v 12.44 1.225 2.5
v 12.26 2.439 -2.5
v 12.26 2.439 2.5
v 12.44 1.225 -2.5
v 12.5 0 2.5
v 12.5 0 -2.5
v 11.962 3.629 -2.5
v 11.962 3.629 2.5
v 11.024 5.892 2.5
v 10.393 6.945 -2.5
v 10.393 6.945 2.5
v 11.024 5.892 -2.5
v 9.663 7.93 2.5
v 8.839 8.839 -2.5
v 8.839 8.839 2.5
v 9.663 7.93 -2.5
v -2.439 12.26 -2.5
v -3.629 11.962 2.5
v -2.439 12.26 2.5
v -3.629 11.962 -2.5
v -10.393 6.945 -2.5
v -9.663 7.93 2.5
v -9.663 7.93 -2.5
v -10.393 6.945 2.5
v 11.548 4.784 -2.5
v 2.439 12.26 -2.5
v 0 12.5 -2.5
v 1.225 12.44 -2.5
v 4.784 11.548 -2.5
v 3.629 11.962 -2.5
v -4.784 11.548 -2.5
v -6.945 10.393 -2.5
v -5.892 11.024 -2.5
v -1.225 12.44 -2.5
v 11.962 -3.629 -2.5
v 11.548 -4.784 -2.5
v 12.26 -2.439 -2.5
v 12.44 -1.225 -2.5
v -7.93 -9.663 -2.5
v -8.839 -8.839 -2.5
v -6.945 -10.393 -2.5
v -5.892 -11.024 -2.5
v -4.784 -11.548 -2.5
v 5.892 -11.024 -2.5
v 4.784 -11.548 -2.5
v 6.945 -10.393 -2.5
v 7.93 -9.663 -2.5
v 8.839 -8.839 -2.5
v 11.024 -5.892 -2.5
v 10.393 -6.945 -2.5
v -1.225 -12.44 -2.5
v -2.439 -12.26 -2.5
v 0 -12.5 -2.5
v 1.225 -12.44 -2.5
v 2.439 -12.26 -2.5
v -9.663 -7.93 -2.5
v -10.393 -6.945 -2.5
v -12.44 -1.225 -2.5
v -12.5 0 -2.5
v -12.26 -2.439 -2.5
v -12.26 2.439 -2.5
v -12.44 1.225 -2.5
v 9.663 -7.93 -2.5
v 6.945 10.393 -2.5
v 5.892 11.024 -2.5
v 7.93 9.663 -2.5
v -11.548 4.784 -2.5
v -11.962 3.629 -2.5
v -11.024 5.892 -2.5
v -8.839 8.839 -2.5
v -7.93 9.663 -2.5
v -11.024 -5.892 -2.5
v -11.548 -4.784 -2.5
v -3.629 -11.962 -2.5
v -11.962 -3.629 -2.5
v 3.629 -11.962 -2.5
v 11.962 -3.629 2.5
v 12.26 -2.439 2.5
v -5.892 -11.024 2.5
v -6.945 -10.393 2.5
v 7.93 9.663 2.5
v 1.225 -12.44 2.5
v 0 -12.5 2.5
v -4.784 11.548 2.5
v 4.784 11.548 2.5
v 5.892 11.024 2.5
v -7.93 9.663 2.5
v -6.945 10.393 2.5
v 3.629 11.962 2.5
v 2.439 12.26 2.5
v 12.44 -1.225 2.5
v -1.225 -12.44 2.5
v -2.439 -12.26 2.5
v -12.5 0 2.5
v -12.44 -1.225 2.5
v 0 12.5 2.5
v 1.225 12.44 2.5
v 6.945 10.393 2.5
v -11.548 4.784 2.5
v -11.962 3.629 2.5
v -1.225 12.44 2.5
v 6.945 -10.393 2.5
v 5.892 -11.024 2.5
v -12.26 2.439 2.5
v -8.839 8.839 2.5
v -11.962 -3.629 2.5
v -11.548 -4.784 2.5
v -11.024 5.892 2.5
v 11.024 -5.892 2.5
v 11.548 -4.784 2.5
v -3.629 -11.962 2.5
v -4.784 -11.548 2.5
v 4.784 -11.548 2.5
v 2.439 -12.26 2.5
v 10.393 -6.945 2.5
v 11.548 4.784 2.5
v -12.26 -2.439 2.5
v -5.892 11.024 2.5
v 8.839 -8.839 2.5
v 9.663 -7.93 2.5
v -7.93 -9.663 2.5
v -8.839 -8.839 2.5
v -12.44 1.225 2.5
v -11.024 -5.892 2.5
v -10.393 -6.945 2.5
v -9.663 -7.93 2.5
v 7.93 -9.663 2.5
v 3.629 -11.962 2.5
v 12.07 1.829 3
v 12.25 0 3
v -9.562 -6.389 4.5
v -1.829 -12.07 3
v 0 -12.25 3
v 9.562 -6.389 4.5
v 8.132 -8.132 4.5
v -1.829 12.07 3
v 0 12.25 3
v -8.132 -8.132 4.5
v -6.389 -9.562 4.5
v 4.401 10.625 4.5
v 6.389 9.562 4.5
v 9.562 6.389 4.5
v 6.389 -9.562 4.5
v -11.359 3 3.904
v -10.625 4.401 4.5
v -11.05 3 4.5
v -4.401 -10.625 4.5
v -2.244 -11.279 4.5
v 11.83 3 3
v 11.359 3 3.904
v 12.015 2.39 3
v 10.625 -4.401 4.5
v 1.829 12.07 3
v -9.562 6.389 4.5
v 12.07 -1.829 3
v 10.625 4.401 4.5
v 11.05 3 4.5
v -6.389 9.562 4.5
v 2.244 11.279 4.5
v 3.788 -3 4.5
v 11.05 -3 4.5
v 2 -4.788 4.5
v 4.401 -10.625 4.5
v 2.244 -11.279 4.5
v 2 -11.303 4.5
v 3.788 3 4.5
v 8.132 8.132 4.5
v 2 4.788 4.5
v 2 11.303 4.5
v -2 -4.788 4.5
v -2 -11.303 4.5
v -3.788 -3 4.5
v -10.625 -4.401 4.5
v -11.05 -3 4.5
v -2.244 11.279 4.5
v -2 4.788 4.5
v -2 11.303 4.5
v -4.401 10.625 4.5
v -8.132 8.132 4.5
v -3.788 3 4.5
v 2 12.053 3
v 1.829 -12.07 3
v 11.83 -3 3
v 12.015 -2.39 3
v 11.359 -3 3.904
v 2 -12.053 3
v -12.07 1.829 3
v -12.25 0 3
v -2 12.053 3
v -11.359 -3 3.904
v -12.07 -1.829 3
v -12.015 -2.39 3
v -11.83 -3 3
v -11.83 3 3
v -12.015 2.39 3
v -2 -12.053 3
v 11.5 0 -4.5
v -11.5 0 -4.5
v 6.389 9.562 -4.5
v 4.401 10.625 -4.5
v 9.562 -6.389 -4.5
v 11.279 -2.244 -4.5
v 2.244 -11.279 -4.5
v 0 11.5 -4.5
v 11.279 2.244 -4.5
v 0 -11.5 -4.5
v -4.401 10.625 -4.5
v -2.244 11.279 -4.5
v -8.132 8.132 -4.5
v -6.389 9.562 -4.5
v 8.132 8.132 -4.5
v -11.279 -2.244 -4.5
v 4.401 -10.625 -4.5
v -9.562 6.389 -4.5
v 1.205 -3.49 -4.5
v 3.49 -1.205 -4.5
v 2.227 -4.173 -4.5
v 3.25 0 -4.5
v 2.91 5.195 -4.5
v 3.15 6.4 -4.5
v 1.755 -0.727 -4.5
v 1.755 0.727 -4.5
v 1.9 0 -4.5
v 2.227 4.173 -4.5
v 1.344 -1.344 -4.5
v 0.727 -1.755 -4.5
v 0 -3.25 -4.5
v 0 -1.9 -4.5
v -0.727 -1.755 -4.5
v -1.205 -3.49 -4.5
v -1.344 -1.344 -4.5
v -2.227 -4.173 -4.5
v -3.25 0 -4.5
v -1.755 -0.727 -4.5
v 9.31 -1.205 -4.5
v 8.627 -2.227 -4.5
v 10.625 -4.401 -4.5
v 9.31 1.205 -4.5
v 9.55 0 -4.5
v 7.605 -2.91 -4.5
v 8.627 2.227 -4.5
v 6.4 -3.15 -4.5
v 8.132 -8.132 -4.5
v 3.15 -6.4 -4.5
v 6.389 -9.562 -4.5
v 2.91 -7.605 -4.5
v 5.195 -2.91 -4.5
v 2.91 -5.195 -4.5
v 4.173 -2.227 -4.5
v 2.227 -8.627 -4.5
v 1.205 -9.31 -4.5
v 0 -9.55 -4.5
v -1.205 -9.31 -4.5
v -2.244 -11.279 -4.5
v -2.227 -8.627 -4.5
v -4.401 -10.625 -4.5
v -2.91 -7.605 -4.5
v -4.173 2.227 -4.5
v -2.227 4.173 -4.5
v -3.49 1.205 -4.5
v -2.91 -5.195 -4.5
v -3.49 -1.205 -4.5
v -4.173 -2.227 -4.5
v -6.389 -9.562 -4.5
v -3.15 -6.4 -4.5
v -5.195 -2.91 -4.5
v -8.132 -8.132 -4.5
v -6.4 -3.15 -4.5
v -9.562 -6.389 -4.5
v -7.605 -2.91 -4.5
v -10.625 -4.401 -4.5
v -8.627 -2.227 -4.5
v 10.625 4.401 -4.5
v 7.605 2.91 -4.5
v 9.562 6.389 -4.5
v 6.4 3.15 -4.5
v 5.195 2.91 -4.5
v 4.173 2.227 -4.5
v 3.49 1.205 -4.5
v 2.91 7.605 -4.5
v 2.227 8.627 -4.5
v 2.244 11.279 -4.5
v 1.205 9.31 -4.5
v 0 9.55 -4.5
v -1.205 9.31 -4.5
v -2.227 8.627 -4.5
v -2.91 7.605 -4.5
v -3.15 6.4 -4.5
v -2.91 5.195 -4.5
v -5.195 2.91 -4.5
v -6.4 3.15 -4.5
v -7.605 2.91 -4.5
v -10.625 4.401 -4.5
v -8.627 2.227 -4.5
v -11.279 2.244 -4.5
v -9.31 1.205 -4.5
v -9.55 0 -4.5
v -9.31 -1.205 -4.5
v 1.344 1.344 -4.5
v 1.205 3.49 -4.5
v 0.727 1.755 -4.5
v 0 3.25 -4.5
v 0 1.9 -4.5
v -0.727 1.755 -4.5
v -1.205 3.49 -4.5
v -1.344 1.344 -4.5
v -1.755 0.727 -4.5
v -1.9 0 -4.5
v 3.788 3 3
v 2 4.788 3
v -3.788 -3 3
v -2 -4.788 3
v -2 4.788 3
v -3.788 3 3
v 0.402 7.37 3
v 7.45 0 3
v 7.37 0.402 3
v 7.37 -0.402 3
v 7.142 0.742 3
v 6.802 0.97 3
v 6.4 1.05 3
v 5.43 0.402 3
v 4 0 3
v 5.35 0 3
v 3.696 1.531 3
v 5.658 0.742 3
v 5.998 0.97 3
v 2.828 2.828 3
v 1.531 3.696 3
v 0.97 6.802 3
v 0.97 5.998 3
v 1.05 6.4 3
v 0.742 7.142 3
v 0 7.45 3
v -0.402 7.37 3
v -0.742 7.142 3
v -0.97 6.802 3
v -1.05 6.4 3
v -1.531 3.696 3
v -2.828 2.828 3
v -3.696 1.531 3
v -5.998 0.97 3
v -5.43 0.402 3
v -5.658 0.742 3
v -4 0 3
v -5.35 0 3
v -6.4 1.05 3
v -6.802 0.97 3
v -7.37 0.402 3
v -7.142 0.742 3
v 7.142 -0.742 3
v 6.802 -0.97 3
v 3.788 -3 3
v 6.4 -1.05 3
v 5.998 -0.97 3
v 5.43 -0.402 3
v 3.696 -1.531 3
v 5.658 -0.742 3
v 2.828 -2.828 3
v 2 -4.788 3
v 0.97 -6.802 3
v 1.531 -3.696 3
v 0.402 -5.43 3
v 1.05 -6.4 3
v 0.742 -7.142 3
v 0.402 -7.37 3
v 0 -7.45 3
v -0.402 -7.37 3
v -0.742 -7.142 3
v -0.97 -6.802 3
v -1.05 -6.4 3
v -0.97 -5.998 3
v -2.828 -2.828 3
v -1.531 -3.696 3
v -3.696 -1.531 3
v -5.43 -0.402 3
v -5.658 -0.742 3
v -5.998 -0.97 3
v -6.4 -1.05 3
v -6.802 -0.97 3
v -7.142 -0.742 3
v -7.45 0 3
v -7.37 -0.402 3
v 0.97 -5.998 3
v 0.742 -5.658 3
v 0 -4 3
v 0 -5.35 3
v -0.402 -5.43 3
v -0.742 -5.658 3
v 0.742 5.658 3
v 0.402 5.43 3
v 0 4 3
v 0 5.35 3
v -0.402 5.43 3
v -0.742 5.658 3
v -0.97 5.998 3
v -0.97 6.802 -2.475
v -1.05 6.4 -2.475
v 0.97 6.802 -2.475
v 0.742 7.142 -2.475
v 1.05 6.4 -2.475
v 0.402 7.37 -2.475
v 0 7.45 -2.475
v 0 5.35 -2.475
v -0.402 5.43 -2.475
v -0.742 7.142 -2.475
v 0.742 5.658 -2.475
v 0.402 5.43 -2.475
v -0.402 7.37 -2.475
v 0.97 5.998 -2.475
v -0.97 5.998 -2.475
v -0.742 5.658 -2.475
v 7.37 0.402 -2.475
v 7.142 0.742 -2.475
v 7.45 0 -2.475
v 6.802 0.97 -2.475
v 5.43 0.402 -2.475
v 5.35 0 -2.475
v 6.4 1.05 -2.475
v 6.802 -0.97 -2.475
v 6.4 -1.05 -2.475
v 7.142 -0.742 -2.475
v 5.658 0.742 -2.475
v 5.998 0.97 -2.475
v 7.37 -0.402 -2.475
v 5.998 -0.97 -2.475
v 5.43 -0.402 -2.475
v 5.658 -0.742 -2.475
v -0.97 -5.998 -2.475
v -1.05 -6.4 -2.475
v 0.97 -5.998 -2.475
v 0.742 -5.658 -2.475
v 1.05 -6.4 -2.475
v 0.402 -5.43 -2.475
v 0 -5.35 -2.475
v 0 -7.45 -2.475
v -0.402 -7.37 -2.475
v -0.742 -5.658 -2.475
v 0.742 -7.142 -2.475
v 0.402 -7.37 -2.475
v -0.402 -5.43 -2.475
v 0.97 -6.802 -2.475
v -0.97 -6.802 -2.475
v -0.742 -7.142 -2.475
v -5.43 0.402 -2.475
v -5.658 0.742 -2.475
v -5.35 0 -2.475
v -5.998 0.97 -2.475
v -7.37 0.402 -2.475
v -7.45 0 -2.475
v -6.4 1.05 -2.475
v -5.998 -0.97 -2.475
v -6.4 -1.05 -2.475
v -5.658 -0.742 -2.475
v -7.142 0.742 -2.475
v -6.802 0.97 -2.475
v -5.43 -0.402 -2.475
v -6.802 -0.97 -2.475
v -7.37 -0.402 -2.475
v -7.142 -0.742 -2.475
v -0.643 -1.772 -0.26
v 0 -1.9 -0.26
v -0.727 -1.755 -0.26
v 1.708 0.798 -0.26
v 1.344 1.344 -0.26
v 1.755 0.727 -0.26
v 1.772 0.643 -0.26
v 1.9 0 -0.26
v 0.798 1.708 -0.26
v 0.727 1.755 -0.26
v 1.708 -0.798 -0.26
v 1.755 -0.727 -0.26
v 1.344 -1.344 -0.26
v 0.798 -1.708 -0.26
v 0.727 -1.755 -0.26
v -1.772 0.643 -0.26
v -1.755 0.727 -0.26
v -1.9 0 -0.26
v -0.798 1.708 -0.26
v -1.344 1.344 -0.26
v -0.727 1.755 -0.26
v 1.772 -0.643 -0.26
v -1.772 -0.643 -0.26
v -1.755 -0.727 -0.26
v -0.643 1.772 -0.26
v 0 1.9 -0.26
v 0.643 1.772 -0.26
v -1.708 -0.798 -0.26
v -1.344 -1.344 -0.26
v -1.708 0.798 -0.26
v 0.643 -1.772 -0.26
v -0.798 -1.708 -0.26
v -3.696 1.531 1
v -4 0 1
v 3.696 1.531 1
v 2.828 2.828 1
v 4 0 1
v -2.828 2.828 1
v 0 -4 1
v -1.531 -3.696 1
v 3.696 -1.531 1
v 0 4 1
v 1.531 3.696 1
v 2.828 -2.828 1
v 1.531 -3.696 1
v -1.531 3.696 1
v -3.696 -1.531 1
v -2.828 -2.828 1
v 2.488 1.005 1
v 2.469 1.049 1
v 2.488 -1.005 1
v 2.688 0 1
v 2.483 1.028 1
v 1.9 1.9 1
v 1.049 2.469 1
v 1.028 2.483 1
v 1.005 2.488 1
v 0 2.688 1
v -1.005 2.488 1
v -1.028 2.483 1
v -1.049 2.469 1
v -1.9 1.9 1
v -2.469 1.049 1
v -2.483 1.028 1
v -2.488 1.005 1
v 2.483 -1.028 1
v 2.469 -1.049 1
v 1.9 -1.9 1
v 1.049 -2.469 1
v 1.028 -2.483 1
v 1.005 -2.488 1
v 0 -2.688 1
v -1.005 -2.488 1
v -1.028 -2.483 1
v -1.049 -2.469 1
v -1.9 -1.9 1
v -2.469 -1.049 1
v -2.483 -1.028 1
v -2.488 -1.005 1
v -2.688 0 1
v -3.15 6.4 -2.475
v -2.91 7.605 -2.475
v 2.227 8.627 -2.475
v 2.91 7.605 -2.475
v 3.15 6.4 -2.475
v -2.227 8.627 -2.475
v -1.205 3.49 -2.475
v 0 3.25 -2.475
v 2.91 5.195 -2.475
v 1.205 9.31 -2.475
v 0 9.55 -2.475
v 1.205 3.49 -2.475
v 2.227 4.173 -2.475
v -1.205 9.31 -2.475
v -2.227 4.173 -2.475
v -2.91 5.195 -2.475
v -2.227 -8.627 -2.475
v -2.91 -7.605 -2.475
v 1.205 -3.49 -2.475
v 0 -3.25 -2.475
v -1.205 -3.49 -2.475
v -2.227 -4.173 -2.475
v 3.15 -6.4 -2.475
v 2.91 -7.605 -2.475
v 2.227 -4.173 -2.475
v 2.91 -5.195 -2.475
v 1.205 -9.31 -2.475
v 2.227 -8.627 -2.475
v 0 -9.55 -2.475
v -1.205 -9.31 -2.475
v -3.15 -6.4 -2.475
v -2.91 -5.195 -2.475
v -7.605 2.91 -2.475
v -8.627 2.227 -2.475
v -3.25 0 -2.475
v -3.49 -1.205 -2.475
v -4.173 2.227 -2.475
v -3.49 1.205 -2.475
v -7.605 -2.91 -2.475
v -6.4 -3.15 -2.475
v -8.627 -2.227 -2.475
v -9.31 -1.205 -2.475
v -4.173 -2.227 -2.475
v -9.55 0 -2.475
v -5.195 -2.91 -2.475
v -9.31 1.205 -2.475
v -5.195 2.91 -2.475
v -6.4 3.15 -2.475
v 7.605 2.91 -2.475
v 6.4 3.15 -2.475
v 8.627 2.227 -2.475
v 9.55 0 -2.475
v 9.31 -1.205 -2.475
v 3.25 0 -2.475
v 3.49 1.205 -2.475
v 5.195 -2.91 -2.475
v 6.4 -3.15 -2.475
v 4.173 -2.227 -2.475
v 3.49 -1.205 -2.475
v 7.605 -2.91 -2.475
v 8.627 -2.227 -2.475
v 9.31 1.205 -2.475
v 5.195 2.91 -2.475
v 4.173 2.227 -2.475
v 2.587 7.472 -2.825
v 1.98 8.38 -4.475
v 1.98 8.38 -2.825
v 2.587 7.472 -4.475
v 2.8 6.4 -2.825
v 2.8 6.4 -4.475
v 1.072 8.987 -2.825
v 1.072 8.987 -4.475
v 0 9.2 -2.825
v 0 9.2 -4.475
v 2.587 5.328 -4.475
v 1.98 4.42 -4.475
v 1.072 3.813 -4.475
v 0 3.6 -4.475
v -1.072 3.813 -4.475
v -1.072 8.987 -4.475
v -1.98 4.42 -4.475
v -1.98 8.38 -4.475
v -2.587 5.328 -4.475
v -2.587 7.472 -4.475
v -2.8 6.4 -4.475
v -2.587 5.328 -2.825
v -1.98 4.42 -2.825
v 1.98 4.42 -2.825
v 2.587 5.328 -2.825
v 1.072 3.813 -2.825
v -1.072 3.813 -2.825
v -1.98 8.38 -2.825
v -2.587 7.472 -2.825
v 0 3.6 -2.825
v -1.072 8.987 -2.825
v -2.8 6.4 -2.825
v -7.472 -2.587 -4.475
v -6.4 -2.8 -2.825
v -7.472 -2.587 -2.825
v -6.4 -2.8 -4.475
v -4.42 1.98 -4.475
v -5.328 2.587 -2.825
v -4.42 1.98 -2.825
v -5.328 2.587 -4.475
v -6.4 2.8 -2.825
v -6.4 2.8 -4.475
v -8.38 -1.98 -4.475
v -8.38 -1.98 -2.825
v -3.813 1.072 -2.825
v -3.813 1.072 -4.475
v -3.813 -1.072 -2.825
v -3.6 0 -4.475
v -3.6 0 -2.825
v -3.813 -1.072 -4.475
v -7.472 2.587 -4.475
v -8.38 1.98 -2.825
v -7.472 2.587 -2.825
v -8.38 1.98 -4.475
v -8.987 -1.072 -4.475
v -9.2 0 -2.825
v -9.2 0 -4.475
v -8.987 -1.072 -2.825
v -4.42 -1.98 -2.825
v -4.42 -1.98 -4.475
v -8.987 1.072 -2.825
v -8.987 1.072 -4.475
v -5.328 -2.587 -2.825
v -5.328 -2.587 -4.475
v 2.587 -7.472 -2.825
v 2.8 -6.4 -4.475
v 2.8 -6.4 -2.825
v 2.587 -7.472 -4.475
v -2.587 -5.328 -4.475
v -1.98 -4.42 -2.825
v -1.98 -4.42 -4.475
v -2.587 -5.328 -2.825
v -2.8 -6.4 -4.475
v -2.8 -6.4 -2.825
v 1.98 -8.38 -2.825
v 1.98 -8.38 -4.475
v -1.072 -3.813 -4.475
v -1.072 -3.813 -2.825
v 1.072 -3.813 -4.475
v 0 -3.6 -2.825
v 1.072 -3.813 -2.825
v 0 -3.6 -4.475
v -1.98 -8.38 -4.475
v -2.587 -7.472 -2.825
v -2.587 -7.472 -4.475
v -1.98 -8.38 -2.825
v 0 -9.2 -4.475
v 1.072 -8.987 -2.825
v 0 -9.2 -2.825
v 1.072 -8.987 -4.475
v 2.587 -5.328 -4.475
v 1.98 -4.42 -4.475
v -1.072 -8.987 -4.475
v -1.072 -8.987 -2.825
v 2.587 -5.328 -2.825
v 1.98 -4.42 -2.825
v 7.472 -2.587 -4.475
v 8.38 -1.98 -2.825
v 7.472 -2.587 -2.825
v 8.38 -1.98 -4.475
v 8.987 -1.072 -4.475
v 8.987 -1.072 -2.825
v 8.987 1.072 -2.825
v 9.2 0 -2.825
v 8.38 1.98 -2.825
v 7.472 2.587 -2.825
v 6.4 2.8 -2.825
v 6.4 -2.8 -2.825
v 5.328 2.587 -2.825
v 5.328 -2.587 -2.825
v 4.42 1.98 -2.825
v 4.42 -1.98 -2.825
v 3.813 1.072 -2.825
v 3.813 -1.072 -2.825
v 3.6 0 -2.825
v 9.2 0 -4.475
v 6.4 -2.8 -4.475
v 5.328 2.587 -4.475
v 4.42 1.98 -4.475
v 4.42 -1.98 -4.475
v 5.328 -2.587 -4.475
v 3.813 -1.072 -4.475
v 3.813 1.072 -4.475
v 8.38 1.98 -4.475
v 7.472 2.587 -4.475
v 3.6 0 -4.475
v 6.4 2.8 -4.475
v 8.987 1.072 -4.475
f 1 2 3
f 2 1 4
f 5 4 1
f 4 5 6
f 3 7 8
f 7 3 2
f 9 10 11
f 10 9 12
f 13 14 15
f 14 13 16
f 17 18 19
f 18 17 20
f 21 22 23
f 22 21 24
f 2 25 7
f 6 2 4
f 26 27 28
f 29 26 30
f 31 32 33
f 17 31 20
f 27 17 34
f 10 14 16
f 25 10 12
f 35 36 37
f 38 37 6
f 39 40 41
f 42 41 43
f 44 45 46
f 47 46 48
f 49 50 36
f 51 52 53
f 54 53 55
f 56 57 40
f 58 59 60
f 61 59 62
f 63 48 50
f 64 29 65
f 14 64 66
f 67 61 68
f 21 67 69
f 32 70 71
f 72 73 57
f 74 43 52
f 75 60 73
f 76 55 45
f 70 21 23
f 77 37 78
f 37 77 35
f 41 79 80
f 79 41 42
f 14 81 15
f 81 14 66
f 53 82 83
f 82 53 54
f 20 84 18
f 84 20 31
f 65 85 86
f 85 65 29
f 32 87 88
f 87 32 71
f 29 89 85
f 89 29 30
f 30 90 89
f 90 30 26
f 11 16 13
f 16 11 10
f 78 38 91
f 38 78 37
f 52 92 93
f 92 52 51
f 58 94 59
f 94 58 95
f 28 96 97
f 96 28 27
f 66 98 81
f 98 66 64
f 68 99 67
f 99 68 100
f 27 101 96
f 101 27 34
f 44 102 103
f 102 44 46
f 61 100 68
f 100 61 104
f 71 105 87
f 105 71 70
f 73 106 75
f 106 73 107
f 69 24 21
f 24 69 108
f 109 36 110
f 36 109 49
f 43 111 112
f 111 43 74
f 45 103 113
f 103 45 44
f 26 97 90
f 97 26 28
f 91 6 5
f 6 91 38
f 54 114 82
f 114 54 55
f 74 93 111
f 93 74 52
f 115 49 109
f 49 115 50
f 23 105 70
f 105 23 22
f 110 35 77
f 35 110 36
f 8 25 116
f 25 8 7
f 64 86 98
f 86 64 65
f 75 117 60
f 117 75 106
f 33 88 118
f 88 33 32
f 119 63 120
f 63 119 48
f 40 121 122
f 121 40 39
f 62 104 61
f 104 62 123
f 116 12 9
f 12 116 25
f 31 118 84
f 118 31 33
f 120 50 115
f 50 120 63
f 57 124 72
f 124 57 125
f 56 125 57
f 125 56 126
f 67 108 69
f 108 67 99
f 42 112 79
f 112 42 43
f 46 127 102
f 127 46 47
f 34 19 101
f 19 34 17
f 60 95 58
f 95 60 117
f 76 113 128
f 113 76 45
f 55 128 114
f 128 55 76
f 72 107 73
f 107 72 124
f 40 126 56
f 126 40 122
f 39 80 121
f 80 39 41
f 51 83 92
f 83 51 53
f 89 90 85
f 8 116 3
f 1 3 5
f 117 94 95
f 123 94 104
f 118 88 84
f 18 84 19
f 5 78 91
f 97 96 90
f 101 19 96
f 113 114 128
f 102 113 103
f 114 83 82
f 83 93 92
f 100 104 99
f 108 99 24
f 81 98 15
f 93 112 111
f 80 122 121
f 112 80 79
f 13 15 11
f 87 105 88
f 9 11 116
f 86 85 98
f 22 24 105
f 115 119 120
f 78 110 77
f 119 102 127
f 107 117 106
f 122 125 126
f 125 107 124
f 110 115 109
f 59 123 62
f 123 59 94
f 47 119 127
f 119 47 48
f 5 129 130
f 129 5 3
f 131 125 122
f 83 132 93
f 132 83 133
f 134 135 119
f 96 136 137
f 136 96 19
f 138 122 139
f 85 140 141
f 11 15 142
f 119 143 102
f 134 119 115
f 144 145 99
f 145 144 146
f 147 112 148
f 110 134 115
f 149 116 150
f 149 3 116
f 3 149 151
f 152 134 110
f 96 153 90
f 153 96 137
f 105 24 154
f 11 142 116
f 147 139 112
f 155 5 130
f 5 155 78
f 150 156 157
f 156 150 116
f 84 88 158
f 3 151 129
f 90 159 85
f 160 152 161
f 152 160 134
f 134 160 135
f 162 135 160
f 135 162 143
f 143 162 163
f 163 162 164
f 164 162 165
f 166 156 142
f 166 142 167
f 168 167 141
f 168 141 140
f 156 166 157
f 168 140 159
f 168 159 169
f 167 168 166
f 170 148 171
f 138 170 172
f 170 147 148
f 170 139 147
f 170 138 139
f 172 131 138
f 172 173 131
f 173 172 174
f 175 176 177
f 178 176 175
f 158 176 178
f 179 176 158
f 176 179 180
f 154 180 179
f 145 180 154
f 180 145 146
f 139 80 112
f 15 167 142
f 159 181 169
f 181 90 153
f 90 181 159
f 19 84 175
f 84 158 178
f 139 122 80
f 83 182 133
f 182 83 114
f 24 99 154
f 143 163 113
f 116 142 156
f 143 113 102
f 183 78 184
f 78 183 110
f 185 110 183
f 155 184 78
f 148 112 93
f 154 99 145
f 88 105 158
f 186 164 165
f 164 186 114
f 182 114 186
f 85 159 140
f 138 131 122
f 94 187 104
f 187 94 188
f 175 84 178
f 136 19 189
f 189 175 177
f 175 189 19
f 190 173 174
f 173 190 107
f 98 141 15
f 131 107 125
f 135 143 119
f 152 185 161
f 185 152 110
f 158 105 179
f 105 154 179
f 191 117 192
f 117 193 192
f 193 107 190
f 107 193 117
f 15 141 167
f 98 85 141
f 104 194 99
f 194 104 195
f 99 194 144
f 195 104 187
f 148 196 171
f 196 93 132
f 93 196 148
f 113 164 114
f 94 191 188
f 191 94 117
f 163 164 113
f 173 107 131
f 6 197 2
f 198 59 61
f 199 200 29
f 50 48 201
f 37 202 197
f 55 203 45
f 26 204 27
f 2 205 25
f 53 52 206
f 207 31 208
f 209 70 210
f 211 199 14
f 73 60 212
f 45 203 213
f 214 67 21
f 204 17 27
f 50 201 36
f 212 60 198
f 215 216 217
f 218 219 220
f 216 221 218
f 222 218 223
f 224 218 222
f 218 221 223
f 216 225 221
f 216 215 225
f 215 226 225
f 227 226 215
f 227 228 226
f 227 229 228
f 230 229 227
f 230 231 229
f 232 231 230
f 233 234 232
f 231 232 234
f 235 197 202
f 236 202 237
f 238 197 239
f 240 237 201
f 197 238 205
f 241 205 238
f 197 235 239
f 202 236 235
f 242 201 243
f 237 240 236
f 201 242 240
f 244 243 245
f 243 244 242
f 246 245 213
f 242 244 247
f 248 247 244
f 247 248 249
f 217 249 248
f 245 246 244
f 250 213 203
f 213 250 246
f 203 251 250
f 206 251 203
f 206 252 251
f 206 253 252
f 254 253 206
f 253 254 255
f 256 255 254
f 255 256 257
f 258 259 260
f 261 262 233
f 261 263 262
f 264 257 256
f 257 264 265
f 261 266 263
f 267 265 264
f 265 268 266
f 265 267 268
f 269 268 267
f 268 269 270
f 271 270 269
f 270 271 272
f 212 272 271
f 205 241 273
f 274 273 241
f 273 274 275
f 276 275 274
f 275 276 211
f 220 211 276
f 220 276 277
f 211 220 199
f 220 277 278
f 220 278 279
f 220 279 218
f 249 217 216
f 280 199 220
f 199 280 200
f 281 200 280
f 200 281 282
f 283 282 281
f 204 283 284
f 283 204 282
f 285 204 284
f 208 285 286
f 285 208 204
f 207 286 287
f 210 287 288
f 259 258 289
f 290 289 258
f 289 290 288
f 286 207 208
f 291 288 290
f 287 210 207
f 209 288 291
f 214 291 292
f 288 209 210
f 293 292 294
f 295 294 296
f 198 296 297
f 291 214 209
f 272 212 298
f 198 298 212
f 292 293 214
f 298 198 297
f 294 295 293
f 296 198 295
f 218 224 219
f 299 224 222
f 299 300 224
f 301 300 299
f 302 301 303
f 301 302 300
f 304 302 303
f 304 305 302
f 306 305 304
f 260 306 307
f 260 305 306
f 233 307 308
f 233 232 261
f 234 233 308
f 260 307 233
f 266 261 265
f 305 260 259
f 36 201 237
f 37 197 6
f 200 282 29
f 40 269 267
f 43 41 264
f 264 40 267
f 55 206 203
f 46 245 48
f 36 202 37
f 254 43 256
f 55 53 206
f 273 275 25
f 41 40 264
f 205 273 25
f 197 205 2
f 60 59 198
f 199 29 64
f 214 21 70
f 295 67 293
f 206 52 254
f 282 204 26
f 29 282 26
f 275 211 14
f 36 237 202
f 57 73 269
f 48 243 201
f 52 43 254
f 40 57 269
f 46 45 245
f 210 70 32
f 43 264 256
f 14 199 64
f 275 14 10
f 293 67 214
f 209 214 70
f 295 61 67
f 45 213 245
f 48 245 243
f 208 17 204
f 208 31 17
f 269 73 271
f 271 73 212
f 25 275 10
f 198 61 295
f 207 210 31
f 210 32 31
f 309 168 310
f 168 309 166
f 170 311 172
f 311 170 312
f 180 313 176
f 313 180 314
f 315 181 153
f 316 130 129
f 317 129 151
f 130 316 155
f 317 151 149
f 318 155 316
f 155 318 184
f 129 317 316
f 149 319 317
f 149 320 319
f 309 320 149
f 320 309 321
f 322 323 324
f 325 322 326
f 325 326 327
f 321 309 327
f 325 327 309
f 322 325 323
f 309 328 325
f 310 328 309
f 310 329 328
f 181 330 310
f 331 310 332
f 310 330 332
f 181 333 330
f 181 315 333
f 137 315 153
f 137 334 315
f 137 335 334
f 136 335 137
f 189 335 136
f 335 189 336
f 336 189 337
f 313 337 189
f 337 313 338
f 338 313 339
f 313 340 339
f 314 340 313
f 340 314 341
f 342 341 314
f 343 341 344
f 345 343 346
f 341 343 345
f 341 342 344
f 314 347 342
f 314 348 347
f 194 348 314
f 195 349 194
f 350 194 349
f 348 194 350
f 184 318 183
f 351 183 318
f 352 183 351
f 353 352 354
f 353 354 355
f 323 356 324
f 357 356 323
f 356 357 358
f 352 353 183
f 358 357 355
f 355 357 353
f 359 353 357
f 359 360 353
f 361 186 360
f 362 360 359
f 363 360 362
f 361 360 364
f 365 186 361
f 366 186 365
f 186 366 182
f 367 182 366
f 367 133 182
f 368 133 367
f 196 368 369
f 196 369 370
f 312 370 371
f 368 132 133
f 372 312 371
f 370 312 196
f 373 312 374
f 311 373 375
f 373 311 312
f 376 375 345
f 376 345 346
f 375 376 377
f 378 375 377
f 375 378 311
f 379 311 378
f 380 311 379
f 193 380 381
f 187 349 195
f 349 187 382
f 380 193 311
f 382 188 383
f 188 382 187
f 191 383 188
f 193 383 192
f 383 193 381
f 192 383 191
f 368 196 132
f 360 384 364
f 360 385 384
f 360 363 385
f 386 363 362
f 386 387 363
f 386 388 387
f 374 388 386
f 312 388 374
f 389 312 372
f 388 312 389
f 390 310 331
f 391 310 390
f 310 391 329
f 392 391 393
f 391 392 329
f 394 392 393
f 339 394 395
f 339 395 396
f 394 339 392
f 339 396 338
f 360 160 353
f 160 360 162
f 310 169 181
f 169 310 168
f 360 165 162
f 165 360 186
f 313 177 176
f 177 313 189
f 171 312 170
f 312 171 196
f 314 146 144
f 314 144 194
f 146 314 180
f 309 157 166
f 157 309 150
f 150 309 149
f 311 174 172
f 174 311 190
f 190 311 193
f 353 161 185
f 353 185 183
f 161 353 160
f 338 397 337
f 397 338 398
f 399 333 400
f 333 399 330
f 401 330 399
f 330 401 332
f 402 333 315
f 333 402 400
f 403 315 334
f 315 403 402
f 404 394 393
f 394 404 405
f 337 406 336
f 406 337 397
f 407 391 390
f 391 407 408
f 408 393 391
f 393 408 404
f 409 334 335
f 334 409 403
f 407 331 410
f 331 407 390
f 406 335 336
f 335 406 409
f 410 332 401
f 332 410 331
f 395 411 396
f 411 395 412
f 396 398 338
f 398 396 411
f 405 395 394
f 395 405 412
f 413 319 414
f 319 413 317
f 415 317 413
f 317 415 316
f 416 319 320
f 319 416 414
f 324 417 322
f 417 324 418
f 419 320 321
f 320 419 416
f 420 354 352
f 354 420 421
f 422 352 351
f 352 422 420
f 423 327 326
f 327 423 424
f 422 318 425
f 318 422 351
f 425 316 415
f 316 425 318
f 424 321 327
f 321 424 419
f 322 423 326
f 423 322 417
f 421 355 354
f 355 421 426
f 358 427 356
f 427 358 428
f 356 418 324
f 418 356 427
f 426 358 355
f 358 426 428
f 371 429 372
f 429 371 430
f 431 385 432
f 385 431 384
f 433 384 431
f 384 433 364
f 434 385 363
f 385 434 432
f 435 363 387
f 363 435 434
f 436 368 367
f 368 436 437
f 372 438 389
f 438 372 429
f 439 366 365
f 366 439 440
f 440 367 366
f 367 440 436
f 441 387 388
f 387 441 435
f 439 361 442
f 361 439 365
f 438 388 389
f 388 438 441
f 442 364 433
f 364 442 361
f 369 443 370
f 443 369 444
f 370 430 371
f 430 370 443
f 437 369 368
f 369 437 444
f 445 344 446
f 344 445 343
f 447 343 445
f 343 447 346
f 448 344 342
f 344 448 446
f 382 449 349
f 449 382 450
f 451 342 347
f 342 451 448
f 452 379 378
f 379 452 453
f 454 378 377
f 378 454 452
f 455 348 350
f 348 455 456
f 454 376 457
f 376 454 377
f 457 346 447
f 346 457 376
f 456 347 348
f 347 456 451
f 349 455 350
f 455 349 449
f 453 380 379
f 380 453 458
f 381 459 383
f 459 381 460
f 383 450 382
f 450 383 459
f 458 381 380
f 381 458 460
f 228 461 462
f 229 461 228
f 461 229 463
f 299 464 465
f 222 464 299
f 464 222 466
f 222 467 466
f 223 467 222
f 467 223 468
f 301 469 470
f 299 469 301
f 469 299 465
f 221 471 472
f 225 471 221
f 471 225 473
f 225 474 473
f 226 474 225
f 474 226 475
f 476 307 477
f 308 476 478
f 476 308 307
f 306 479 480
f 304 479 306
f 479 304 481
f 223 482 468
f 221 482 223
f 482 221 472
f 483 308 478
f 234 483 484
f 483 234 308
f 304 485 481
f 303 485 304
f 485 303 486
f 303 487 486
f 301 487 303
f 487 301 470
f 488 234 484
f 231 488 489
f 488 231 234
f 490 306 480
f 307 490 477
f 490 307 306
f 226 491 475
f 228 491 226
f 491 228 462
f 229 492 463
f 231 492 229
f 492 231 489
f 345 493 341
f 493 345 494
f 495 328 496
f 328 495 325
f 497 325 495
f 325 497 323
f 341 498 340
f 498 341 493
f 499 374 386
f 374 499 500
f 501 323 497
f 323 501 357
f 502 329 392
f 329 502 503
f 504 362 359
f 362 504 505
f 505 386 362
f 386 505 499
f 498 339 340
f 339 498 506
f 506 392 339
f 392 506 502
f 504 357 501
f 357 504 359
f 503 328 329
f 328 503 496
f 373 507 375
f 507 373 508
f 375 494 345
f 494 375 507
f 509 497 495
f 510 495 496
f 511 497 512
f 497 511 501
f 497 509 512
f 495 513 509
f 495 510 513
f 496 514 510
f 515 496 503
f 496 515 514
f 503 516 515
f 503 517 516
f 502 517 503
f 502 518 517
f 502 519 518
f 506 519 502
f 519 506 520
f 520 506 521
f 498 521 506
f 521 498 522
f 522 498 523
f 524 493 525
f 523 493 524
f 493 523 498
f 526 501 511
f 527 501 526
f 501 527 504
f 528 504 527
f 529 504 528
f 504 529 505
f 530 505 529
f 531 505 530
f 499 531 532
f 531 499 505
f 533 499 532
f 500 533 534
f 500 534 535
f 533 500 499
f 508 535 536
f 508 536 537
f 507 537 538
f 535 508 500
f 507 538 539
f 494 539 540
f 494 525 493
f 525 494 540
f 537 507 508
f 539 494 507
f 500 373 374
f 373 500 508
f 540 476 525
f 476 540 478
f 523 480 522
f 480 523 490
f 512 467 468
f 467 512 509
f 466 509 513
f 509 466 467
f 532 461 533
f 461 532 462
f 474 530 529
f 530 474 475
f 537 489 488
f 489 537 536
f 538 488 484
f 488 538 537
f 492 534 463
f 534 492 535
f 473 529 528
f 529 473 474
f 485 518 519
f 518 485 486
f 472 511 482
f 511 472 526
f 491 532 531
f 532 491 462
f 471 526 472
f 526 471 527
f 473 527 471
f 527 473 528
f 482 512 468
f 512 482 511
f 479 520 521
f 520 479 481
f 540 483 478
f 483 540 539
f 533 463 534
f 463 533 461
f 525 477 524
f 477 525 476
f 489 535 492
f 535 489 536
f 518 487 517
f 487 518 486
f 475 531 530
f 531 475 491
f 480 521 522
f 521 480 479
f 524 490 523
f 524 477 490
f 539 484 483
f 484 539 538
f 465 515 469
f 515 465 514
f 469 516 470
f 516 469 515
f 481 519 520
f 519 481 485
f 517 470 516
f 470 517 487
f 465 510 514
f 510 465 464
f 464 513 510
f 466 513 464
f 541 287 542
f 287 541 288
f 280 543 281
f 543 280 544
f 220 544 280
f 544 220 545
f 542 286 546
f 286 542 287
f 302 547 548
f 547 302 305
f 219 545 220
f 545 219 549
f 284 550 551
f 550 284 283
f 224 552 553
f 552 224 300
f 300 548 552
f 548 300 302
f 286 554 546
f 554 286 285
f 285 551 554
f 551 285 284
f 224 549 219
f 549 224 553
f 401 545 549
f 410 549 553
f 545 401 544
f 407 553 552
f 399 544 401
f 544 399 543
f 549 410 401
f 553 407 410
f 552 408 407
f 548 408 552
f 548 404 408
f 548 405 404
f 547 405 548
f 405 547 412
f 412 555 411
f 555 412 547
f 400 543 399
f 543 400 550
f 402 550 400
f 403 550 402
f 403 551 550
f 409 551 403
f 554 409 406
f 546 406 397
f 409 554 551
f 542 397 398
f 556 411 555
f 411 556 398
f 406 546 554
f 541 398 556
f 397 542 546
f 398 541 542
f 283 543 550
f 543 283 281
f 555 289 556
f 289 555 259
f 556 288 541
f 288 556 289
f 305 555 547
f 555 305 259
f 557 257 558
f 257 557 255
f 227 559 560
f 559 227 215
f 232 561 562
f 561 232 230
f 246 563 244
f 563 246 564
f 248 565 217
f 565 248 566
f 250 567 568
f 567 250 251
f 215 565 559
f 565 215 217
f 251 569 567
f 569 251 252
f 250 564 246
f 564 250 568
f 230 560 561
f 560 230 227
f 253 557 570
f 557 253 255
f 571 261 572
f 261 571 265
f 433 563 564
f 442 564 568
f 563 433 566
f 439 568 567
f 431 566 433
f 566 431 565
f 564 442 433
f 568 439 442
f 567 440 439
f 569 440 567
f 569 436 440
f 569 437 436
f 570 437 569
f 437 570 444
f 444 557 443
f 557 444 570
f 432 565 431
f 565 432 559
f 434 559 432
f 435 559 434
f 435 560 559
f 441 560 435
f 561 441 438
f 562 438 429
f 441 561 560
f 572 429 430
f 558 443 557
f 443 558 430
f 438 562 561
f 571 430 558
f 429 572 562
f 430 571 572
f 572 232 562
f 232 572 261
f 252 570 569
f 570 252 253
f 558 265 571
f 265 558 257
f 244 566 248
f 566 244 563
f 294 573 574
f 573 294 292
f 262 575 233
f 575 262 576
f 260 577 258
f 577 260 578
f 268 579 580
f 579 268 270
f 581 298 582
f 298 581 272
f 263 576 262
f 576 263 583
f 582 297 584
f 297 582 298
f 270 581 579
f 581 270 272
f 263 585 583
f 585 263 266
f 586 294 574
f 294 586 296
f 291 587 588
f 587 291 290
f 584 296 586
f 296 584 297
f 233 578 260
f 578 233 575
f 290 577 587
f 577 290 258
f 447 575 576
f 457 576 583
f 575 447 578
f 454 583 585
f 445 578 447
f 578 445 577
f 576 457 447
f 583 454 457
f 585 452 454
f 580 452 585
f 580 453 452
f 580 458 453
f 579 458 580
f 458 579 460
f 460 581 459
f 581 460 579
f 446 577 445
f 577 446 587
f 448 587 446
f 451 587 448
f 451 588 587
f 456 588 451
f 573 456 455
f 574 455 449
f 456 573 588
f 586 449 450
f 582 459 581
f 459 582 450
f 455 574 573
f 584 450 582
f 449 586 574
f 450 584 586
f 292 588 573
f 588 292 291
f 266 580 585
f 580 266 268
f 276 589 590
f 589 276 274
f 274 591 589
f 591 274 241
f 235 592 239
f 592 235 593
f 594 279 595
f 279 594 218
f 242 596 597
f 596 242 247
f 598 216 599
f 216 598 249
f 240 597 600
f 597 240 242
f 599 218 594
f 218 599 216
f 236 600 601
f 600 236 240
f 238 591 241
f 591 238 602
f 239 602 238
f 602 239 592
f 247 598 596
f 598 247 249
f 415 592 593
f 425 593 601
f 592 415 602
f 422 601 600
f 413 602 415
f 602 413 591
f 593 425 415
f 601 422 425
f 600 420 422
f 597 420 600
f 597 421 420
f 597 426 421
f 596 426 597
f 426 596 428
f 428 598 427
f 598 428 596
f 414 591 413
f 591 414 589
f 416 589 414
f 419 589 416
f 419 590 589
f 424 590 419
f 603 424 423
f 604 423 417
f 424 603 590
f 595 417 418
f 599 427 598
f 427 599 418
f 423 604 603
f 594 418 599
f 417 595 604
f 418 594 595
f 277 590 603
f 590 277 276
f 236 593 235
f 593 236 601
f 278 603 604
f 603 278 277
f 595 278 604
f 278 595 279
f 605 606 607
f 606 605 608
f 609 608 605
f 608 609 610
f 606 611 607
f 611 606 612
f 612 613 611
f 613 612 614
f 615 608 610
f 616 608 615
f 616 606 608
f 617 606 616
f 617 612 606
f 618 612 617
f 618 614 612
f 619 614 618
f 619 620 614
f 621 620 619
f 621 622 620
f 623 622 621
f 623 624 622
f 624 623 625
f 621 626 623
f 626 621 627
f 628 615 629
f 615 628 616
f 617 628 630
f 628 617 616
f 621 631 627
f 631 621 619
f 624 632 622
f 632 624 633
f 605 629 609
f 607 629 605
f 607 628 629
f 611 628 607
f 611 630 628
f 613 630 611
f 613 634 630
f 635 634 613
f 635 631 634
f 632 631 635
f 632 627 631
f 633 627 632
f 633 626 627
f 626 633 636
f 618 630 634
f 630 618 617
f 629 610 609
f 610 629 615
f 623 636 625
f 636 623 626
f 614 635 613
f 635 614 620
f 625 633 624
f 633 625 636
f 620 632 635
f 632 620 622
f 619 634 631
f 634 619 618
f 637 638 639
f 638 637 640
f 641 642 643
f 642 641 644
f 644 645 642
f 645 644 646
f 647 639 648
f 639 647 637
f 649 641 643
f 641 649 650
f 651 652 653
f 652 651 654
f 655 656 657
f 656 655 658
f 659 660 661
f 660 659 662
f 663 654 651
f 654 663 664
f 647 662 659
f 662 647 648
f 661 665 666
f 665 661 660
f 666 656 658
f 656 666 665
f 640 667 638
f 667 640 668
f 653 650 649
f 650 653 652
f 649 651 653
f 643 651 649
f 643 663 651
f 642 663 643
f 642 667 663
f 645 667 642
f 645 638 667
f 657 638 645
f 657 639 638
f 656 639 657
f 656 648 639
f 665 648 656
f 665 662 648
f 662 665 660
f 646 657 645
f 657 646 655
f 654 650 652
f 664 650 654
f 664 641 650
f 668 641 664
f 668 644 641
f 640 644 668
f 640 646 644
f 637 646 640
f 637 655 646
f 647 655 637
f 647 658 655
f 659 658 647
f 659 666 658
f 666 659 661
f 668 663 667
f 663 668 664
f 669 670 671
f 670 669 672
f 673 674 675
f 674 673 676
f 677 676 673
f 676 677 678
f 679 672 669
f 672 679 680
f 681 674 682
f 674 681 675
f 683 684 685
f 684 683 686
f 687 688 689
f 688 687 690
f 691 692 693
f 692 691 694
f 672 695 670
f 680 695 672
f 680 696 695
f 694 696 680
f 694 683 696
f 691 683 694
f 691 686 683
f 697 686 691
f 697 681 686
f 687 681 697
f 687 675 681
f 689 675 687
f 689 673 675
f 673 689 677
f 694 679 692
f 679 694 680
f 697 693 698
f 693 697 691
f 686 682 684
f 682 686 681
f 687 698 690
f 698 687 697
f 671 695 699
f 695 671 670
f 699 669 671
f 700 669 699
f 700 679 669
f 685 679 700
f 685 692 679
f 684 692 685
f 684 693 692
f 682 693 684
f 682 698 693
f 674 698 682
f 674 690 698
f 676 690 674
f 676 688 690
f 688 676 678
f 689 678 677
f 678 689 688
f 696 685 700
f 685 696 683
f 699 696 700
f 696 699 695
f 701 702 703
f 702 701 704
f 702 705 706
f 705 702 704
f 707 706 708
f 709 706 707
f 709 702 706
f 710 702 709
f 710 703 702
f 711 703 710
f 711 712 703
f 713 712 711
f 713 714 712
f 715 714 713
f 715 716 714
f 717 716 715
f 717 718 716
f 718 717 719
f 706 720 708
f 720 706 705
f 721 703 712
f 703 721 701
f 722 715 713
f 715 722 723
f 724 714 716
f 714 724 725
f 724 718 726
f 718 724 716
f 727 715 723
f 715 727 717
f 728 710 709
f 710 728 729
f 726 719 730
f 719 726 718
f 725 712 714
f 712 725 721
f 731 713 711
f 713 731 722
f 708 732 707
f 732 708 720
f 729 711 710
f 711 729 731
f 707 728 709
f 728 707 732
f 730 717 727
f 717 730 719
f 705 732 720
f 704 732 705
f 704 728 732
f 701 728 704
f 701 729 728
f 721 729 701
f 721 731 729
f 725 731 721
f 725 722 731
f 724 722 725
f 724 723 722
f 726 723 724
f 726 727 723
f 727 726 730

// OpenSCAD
d_bearing  = 10+0.3;
d_cylinder = 15+10;
h_cylinder = 10-5;
h_bottom   = 3;
width_wall_x = 4;
width_wall_y = 6;
d_side_hole = 2.1;
d_central_hole = 7;
r_horn_x = 6.4;
r_horn_y = 6.4;
deep_hole_mask = 3;
d_screw_m3 = 3.8;

module hole_mask() {
translate([0, 0, deep_hole_mask]) rotate([0, 0, 45])
  cube([1.6*width_wall_y, 1.6*width_wall_y, h_cylinder+1], center = true);
translate([0, 0, deep_hole_mask]) rotate([0, 0, 0])
cube([width_wall_x, d_cylinder+5, h_cylinder+1], center = true);
translate([0, 0, deep_hole_mask]) rotate([0, 0, 0])
cube([d_cylinder+5, width_wall_y, h_cylinder+1], center = true);

translate([0, r_horn_y, 0])
  cylinder(d=d_side_hole, h=2*h_cylinder+6, center=true, $fn=16);
translate([r_horn_x,0, 0])
  cylinder(d=d_side_hole, h=2*h_cylinder+6, center=true, $fn=16);    
translate([0, -r_horn_y, 0])
  cylinder(d=d_side_hole, h=2*h_cylinder+6, center=true, $fn=16);    
translate([-r_horn_x, 0, 0])
  cylinder(d=d_side_hole, h=2*h_cylinder+6, center=true, $fn=16);    
translate([0, 0, 0])
  cylinder(d=d_screw_m3, h=2*h_cylinder+6, center=true, $fn=16);
//  cylinder(d=d_central_hole, h=2*h_cylinder+6, center=true, $fn=16);
//translate([0, 0, (h_cylinder+3-h_cylinder)])
//  #cylinder(d=d_bearing, h=2*h_cylinder+6, center=true, $fn=32);    

}

module hole_head_screw1(){
  cylinder(d = 8, h = 3 + 1, center=true, $fn=16);
  translate([0, 0, -(3 + 0.5)])
    cylinder(d1 = 1, d2 = 6, h = 3 + 1, center=true, $fn=16);  
}

module hole_head_screw1(){
  cylinder(d = 8, h = 3 + 1, center=true, $fn=16);
  translate([0, 0, -(3 + 0.5)])
    cylinder(d1 = 1, d2 = 6, h = 3 + 1, center=true, $fn=16);  
}

module hole_head_screw2(){
  translate([0, r_horn_y, -4 + 0.35])
   cylinder(d=3*d_side_hole, h = 2 + 0.35, center=true, $fn=16);
}

module hole_head_screw3(){
  hole_head_screw2();
  mirror([0, 1, 0])
    hole_head_screw2();
  mirror([1, 1, 0])
    hole_head_screw2();
  mirror([1, 0, 0])
    mirror([1, 1, 0])
      hole_head_screw2();
}

module support_hole_head_screw2(){
  translate([0, r_horn_y, -4 + 0.35 + -0])
    cylinder(d=3*d_side_hole-0.7, h=2-0.35, center=true, $fn=16);
}

module support_hole_head_screw3(){

  support_hole_head_screw2();
  mirror([1, 1, 0])
    support_hole_head_screw2();
  mirror([0, 1, 0])
    support_hole_head_screw2();
  mirror([1, 0, 0])
    mirror([1, 1, 0])
      support_hole_head_screw2();
}

module barrel() {
cylinder(d=d_cylinder, h=h_cylinder, center=true, $fn=64);
translate([0, 0, h_cylinder/2+1])
  cylinder(d1=d_cylinder, d2=d_cylinder - 2, h=2, center=true, $fn=32);
mirror([0,0,1])
  translate([0, 0, h_cylinder/2+1])
    cylinder(d1=d_cylinder, d2=d_cylinder - 2, h=2, center=true, $fn=32);}

module wheel1() {
difference() {

 barrel();
    translate([0, 0, h_bottom])
      hole_mask();
  translate([0, 0, h_cylinder - (3 + 1)/2])
    hole_head_screw1();
  hole_head_screw3();
  }
}


difference() {
wheel1();
//translate([16, 0, 0])
//cube([20, 20, 15], true);
}
support_hole_head_screw3();
//hole_head_screw1();
//hole_head_screw2();
